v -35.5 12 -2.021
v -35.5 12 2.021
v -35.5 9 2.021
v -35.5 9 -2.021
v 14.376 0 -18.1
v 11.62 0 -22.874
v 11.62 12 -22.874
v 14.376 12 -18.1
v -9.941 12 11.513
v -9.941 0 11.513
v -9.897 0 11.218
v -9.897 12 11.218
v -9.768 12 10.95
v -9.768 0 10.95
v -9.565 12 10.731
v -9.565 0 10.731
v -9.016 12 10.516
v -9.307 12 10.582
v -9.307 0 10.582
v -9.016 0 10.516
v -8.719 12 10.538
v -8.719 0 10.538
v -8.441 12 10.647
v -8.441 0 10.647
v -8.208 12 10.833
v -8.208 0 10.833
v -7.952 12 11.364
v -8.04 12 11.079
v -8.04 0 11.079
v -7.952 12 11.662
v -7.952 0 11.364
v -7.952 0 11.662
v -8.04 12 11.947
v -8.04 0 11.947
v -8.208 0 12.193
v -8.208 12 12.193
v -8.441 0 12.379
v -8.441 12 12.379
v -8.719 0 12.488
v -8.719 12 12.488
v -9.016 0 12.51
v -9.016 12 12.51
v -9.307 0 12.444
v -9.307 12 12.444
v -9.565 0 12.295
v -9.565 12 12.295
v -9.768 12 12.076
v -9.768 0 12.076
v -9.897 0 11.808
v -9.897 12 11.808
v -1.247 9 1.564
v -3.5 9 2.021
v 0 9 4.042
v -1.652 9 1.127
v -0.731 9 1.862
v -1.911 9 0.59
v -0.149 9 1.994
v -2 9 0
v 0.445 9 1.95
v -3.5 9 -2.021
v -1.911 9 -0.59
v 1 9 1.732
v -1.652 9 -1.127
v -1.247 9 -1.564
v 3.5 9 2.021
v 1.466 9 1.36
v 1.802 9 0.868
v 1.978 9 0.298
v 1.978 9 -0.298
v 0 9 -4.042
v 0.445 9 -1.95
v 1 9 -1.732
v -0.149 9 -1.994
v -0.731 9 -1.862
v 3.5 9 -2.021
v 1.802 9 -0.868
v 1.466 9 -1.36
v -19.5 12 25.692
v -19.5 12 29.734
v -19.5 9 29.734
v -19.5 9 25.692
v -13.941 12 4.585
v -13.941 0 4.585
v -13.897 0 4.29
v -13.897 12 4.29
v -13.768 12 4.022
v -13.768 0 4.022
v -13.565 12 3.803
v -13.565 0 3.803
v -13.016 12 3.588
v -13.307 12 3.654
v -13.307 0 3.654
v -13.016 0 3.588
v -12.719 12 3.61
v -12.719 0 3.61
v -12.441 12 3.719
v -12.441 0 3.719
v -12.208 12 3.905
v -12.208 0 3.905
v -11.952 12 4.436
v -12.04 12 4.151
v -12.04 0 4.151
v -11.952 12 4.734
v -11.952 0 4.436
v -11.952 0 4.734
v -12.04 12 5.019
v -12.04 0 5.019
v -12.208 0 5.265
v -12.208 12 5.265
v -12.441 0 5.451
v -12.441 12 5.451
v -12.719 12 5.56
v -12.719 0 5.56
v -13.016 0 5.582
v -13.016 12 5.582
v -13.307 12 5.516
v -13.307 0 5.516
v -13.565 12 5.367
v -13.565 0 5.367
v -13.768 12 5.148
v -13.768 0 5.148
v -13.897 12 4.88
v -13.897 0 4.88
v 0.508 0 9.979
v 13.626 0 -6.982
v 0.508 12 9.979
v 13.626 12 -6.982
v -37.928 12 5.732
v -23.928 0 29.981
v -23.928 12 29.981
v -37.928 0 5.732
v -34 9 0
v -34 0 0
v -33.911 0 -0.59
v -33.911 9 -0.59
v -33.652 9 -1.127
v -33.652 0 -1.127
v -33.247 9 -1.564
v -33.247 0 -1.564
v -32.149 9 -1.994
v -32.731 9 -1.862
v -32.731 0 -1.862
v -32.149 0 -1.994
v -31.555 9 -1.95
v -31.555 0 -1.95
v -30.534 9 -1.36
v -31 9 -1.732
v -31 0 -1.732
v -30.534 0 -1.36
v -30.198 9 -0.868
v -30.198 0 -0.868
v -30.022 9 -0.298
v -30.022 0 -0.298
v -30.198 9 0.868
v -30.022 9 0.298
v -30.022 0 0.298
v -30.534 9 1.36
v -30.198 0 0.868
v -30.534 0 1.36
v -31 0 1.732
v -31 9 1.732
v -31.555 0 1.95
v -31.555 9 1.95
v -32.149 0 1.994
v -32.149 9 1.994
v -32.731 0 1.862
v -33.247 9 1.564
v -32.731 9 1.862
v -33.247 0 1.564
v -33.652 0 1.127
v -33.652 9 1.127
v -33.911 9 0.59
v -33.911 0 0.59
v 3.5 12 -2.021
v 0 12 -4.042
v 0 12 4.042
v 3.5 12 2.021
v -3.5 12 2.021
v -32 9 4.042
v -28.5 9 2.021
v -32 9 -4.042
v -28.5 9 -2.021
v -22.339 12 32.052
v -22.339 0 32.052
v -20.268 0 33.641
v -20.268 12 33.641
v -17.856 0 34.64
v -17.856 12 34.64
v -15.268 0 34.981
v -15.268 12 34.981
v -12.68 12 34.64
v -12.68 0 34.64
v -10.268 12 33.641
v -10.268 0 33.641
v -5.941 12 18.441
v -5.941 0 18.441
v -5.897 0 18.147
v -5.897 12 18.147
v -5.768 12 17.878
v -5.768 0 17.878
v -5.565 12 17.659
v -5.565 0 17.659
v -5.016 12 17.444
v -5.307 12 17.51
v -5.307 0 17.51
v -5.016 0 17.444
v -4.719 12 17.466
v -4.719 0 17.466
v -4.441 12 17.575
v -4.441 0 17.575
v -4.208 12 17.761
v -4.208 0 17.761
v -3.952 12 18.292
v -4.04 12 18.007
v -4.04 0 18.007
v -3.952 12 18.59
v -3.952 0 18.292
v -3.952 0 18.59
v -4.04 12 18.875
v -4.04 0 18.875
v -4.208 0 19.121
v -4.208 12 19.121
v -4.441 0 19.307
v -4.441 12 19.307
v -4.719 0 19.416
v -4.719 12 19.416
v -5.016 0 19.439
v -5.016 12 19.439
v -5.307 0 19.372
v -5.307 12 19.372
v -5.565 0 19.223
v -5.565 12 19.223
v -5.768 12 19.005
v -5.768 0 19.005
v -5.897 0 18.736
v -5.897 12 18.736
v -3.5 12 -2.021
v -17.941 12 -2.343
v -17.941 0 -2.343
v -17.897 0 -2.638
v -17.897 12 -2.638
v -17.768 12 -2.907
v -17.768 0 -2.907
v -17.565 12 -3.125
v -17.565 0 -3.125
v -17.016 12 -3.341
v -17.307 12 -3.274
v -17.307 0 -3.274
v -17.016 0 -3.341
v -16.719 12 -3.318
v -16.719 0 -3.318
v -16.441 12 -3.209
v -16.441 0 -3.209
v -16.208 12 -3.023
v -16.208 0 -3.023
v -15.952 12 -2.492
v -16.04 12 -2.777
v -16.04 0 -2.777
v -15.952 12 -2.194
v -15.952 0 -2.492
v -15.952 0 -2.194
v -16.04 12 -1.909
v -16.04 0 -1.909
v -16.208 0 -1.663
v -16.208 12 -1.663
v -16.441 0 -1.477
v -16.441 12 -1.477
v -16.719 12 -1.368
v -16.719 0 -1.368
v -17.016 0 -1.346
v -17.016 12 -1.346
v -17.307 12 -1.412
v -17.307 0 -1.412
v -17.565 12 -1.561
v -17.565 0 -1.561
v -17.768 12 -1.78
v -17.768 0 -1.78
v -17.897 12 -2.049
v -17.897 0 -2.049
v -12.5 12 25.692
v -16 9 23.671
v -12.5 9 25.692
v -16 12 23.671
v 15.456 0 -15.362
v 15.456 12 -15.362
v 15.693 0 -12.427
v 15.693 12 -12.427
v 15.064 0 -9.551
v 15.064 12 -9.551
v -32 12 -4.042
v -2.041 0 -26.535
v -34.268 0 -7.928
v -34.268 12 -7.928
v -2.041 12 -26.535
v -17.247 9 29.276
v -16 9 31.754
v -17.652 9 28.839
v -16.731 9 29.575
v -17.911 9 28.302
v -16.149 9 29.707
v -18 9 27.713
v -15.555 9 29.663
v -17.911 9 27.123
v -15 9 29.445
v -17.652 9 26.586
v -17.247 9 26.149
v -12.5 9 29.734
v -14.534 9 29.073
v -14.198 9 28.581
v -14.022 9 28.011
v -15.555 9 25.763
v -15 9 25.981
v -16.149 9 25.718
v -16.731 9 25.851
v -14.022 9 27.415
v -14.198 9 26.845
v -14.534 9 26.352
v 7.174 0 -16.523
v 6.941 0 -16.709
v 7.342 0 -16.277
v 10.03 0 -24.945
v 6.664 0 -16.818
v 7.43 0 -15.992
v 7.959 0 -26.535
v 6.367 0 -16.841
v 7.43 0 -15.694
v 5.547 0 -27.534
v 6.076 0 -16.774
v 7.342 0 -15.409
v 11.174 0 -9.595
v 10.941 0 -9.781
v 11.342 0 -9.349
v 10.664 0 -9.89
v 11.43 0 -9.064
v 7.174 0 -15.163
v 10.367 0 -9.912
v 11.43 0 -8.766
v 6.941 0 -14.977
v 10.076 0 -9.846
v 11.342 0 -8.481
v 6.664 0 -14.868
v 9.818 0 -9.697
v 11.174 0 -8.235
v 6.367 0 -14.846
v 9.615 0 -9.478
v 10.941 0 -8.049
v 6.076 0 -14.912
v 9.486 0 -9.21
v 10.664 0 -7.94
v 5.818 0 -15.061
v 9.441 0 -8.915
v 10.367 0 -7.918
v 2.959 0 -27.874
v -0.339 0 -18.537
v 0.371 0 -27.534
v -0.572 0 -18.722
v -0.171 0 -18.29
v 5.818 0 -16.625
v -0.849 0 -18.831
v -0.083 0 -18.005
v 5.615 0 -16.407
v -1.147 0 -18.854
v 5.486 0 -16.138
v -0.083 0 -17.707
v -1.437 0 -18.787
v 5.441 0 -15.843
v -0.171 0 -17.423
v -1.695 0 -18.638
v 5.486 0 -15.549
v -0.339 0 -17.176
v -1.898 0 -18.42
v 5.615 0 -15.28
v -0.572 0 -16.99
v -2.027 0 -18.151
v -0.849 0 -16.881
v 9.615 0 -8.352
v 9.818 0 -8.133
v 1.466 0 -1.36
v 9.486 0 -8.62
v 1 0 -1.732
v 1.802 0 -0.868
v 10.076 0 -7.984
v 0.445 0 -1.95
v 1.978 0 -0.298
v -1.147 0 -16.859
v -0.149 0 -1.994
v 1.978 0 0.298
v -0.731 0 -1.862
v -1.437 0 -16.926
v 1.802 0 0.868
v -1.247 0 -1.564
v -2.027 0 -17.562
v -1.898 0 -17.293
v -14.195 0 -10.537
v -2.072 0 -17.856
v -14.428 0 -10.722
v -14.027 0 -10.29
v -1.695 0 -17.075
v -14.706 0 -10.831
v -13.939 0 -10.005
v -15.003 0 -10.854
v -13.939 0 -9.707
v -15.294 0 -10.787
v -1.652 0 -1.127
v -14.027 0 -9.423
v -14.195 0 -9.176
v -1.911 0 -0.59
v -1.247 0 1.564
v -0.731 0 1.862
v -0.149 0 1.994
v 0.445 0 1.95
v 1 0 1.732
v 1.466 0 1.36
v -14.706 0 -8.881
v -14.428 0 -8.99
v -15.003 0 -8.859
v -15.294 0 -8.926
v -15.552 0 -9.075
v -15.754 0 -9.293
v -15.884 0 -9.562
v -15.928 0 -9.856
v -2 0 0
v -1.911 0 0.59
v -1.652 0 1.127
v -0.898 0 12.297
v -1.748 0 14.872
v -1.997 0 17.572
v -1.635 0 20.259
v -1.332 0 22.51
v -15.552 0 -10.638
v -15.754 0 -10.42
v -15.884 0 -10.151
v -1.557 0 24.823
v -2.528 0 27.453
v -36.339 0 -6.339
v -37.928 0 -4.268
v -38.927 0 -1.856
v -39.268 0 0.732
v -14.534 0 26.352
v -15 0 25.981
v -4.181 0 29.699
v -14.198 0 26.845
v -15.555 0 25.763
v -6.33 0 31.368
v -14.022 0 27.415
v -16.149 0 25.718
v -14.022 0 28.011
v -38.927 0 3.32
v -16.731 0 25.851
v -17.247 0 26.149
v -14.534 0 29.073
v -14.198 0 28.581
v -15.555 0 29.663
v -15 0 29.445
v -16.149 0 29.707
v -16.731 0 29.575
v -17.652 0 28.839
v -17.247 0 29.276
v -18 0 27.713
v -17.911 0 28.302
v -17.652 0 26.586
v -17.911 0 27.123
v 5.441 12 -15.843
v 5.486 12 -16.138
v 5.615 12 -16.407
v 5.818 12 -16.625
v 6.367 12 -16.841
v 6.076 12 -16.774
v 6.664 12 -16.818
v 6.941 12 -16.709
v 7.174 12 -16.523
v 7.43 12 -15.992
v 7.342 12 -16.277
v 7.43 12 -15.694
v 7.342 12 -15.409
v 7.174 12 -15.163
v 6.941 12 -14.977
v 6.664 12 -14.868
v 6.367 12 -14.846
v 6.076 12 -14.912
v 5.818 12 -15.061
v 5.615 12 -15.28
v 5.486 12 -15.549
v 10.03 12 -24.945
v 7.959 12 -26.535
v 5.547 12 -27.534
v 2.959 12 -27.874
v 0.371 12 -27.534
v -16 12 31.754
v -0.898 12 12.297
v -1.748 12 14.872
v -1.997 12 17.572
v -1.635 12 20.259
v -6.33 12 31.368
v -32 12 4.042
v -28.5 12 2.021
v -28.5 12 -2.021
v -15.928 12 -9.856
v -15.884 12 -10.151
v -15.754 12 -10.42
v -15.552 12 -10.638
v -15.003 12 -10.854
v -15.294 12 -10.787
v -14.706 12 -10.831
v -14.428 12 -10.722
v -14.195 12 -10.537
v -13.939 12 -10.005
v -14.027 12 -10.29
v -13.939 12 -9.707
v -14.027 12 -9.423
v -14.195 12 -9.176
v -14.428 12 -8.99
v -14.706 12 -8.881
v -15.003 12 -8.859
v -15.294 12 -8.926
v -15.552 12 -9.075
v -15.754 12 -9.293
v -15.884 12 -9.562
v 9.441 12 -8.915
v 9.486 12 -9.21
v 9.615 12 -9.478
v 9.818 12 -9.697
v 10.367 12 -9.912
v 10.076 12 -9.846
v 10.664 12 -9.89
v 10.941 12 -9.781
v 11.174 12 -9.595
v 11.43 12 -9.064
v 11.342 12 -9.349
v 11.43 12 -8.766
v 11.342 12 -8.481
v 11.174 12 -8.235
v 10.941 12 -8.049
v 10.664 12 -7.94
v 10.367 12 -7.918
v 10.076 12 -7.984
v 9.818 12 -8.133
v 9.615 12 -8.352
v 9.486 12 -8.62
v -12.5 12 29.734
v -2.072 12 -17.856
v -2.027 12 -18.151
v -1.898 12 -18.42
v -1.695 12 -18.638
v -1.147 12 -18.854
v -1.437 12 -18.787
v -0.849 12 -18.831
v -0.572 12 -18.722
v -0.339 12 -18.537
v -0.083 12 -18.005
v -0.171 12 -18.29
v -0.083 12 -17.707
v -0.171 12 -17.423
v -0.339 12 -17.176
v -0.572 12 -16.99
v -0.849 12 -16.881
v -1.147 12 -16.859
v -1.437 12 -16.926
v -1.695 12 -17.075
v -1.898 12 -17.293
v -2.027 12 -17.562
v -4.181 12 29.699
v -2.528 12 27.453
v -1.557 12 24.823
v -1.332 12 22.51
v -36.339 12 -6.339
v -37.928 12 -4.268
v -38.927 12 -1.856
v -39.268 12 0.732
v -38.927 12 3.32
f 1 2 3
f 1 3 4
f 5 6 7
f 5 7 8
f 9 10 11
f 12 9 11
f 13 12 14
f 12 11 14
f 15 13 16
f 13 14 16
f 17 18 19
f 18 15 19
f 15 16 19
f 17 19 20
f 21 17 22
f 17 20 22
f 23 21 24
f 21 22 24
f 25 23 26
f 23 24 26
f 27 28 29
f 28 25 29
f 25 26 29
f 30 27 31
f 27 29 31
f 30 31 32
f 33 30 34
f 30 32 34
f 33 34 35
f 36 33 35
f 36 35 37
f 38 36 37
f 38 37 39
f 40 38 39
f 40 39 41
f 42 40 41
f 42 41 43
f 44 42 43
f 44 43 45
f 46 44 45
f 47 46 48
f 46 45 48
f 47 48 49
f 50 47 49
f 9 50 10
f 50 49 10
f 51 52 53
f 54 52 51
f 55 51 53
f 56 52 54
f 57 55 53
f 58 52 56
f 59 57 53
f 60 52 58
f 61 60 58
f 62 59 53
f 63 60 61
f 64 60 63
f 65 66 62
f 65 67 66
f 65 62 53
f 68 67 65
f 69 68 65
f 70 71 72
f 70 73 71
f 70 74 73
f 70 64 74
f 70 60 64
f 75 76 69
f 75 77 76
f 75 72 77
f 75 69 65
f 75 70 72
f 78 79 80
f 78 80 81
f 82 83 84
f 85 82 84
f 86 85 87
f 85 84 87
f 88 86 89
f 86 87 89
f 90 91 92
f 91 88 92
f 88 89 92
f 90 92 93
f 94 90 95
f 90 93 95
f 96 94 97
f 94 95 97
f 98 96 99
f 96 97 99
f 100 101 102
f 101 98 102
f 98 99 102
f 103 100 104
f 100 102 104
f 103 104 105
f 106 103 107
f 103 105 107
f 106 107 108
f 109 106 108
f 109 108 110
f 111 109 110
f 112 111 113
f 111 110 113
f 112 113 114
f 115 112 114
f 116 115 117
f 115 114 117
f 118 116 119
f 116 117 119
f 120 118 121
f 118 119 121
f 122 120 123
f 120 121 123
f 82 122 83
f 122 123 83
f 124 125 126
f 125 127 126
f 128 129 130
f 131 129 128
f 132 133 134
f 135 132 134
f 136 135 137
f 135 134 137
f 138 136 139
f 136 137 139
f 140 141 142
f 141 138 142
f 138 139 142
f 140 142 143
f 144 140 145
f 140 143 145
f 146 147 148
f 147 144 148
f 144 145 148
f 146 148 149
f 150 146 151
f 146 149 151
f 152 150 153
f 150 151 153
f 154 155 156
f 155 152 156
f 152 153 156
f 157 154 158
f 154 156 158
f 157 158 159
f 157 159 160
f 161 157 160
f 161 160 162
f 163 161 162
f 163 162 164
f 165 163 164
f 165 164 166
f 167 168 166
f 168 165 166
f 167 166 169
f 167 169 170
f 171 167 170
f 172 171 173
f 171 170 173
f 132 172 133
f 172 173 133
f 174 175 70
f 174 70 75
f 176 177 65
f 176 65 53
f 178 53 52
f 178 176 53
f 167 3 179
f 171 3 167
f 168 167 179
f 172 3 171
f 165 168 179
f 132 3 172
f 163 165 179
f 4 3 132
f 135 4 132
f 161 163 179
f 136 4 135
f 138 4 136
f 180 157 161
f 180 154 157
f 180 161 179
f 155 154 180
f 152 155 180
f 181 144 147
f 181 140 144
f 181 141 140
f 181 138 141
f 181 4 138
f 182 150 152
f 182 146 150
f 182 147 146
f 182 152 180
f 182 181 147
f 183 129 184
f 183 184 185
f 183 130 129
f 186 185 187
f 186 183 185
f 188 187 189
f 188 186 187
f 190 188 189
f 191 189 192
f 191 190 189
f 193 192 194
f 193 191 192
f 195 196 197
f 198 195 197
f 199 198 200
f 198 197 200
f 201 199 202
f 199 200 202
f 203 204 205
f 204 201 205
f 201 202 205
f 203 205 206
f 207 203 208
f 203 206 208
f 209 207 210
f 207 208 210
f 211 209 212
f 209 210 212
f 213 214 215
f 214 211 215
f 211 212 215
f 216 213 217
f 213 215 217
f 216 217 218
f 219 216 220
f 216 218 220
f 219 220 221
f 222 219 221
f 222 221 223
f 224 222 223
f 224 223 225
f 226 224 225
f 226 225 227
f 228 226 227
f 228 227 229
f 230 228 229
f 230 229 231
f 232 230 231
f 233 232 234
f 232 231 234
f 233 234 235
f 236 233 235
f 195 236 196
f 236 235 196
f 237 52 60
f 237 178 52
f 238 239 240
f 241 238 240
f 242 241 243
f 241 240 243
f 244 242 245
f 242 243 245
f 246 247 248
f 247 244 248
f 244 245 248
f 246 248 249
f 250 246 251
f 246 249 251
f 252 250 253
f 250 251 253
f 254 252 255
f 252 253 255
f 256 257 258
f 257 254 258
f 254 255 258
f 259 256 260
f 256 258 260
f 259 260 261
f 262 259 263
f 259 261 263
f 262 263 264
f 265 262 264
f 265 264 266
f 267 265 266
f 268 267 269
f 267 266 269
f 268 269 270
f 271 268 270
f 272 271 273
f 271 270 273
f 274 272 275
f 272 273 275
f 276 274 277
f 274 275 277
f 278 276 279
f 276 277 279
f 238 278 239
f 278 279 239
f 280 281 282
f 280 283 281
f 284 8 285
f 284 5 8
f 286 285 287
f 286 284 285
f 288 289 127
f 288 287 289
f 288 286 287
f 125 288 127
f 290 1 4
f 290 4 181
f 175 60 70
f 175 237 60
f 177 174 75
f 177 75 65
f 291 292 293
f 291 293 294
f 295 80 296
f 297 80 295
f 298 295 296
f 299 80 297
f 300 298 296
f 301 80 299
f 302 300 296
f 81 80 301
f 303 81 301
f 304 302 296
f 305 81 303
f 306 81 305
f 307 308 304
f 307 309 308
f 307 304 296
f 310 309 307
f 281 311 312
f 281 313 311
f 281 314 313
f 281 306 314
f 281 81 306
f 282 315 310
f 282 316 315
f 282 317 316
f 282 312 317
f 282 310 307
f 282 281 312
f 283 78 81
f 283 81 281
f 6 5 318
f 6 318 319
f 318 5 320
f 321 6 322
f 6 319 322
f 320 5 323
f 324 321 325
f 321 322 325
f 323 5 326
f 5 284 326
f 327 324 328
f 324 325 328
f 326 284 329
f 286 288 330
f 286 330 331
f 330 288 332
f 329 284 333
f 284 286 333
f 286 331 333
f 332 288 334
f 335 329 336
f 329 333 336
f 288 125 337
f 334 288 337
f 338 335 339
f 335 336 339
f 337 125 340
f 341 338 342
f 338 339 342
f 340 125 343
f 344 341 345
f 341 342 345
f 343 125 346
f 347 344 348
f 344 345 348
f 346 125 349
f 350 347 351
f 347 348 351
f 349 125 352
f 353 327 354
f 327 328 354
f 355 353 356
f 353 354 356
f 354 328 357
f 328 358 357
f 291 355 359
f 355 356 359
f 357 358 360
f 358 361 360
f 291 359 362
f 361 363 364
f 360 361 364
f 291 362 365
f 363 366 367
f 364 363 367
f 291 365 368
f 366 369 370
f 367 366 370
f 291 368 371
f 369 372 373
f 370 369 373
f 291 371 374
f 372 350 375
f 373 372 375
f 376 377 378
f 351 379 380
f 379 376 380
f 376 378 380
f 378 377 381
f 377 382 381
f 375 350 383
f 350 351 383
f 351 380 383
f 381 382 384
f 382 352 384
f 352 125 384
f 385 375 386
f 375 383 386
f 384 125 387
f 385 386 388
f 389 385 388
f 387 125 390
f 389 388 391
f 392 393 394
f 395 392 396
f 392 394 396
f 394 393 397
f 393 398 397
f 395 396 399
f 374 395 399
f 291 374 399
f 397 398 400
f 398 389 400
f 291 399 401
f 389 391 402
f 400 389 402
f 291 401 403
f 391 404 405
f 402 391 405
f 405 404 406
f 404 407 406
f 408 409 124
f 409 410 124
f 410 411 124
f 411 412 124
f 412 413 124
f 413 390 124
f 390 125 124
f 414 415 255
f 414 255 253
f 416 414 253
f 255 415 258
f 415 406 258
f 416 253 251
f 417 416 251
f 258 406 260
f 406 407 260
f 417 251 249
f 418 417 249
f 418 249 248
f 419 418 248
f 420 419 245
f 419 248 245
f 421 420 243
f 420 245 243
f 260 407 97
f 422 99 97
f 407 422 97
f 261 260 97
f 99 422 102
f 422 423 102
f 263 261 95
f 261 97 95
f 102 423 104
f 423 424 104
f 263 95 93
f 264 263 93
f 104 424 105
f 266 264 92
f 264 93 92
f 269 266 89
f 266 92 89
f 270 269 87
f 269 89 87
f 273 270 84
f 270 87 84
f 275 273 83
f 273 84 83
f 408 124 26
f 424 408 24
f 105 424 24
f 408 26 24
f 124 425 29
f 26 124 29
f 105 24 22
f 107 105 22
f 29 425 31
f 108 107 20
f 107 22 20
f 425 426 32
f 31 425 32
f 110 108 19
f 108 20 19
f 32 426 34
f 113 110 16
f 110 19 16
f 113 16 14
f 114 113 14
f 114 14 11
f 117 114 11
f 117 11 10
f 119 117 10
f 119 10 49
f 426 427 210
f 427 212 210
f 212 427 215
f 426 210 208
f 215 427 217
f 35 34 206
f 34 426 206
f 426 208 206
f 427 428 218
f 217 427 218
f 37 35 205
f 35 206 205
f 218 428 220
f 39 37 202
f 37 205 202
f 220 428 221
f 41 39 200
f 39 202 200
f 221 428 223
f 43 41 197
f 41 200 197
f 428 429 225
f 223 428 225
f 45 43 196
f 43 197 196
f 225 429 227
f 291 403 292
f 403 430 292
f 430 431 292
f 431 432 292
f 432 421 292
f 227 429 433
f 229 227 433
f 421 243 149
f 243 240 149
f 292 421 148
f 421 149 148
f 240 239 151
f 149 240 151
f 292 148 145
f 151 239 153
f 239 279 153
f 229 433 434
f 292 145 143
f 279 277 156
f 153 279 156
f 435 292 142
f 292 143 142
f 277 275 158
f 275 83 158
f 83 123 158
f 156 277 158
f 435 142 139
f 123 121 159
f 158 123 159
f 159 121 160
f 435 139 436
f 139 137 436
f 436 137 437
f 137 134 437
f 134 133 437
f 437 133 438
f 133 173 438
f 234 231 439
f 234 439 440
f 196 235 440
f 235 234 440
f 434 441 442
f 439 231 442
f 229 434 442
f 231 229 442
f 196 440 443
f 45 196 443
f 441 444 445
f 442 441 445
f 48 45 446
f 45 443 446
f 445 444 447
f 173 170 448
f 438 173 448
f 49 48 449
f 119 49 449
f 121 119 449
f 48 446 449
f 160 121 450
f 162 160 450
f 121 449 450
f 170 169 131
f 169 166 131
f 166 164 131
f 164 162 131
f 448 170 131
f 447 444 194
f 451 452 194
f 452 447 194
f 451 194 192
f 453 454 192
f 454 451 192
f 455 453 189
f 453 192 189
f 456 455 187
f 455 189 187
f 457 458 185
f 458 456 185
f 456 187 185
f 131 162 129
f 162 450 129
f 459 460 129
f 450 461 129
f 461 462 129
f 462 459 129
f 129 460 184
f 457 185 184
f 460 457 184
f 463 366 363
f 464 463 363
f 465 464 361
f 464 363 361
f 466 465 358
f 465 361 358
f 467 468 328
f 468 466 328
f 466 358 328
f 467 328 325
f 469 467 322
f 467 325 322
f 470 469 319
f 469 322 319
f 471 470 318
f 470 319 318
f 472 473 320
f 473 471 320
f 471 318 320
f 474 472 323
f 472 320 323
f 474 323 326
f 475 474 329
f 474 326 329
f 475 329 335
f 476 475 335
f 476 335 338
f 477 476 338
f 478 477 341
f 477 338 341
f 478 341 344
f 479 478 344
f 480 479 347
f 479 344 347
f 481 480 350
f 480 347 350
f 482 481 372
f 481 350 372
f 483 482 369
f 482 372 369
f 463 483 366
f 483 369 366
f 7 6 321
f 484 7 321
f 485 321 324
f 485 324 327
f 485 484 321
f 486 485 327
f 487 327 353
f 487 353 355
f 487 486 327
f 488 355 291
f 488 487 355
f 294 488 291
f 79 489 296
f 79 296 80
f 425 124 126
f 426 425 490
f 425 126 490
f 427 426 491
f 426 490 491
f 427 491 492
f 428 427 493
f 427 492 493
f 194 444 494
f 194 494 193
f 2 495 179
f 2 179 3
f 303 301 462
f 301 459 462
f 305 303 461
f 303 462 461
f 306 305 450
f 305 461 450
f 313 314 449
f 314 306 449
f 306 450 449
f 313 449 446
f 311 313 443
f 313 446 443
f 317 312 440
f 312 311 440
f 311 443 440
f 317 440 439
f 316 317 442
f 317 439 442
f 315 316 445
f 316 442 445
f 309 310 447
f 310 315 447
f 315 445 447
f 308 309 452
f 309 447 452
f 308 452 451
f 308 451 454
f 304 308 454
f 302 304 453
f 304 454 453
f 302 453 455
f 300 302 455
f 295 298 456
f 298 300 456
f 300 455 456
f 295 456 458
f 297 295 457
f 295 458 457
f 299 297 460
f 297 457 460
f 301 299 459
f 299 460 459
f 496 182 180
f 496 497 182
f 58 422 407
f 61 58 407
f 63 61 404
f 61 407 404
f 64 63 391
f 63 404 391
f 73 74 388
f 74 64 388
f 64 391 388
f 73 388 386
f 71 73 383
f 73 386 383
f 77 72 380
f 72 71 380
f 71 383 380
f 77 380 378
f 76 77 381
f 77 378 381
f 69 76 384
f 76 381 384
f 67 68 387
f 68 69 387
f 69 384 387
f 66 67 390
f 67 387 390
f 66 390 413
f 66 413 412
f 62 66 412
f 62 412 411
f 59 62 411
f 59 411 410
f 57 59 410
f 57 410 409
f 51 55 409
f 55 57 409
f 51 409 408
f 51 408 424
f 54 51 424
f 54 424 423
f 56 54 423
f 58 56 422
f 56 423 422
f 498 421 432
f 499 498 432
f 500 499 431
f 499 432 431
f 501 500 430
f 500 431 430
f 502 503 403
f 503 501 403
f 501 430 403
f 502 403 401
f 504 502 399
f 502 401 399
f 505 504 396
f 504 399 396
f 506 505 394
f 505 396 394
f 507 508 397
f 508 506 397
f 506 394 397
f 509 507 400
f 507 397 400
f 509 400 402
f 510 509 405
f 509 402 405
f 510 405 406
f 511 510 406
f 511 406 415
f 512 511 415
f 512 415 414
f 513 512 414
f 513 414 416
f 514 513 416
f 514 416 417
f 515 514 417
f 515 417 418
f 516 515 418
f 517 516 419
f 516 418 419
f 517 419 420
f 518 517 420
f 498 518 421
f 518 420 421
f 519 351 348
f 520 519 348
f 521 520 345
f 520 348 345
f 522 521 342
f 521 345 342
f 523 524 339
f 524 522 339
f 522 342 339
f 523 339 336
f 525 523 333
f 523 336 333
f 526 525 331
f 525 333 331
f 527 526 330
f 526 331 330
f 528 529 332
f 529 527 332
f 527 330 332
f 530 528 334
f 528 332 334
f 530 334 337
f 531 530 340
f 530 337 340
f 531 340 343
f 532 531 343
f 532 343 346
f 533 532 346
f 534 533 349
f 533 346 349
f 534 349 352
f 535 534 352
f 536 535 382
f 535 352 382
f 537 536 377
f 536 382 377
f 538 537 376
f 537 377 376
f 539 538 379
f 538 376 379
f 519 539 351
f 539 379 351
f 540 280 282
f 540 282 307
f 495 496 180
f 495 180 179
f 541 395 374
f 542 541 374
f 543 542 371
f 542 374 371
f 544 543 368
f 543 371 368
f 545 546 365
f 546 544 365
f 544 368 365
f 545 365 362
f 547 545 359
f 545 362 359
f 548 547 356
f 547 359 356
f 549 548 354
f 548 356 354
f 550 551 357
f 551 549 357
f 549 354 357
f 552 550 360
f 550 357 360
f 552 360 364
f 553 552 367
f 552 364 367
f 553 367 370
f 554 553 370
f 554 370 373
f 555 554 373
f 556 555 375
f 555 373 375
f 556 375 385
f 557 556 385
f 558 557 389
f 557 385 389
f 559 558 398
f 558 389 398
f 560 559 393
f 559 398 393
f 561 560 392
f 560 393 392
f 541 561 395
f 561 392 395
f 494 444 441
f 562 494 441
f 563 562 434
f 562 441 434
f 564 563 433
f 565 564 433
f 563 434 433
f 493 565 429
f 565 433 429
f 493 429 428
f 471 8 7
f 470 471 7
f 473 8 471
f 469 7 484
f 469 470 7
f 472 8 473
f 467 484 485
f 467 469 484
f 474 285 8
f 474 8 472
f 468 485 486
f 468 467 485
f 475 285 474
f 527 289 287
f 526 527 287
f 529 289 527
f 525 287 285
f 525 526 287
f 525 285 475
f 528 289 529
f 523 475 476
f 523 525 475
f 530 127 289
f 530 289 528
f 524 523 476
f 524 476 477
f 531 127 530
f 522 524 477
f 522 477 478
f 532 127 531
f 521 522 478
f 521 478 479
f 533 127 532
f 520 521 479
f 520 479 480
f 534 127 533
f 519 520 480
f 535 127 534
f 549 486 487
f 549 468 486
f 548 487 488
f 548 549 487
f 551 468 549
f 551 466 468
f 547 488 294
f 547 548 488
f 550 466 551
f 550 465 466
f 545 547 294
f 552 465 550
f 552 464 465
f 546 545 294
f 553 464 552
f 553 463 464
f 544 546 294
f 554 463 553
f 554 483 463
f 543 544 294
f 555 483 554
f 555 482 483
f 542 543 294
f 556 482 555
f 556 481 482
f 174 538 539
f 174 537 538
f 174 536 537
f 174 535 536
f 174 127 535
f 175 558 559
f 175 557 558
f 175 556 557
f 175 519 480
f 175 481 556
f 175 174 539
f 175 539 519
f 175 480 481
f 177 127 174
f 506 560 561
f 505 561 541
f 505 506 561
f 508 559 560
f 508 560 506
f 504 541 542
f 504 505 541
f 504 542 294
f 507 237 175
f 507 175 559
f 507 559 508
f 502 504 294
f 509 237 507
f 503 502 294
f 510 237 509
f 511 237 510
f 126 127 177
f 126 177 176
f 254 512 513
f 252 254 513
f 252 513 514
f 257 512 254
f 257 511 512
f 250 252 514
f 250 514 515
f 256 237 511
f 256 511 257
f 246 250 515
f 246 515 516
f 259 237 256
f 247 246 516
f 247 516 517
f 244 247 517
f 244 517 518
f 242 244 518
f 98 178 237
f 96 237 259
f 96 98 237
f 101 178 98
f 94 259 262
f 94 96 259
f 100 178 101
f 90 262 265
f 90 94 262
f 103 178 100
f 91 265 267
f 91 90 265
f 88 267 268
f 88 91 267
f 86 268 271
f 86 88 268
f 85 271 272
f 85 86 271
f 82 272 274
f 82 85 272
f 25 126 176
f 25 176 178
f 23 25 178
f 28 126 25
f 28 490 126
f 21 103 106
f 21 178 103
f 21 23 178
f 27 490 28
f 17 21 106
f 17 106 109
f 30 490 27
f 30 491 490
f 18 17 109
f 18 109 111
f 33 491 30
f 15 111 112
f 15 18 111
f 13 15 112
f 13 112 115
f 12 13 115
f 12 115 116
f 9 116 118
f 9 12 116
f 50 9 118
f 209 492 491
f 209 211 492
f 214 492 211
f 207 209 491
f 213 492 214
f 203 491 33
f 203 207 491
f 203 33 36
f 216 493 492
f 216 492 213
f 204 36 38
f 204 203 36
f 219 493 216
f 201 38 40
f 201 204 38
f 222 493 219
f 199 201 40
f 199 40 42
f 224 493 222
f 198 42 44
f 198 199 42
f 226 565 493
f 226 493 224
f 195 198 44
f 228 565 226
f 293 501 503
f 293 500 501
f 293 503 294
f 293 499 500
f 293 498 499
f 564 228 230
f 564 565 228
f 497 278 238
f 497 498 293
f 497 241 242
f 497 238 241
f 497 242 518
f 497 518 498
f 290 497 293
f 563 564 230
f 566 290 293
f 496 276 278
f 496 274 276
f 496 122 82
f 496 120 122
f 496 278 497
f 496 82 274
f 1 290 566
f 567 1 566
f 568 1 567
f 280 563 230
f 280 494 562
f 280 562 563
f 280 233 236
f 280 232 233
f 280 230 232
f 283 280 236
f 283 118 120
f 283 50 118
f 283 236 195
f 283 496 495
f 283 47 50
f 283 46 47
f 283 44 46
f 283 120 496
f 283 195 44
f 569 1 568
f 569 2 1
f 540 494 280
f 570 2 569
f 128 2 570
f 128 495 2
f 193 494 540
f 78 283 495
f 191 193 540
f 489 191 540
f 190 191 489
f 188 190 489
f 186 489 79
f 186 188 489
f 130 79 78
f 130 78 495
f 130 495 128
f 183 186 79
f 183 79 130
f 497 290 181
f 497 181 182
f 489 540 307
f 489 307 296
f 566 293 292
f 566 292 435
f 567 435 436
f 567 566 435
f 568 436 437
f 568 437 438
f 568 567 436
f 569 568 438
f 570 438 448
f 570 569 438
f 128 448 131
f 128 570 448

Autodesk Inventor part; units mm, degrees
ref_plane "YZ Plane" through (0, 0, 0) normal (1, 0, 0) x (0, 1, 0)
ref_plane "XZ Plane" through (0, 0, 0) normal (0, 1, 0) x (-1, 0, 0)
ref_plane "XY Plane" through (0, 0, 0) normal (0, 0, 1) x (1, 0, 0)
sketch "Esquisse1" plane through (0, 0, 0) normal (0, 1, 0) x (-1, 0, 0)
  line L0 (0, 0) -> (32, 0) construction
  line L1 (32, 0) -> (16, 27.7128) construction
  line L2 (16, 27.7128) -> (0, 0) construction
  line L3 (-10.3913, 17.9982) -> (9.0252, -15.6322) construction
  line L4 (8, -13.8564) -> (32, 0) construction
  line L5 (8, -13.8564) -> (14.9282, -9.8564) construction
  line L6 (8, -13.8564) -> (-10, 17.3205) construction
  line L7 (-10, 17.3205) -> (1.6913, 24.0705) construction
  line L8 (1.6913, 24.0705) -> (4.9413, 18.4413) construction
  line L9 (4.9413, 18.4413) -> (8.9413, 11.5131) construction
  line L10 (8.9413, 11.5131) -> (12.9413, 4.5849) construction
  line L11 (12.9413, 4.5849) -> (16.9413, -2.3433) construction
  circle A0 centre (8.9413, 11.5131) radius 1
  circle A1 centre (12.9413, 4.5849) radius 1
  circle A2 centre (16.9413, -2.3433) radius 1
  circle A3 centre (14.9282, -9.8564) radius 1
  circle A4 centre (4.9413, 18.4413) radius 1
  circle A5 centre (-14.4413, -1.9869) radius 1 construction
  circle A6 centre (-10.4413, -8.9151) radius 1
  circle A7 centre (-6.4413, -15.8433) radius 1
  circle A8 centre (1.0718, -17.8564) radius 1
  circle A9 centre (-18.4413, 4.9413) radius 1 construction
  circle A10 centre (-10, 17.3205) radius 11.6 construction
  line L12 (32, 0) -> (36, -6.9282) construction
  line L13 (36.0415, 0) -> (34.0207, -3.5) construction
  line L14 (34.0207, -3.5) -> (29.9793, -3.5) construction
  line L15 (29.9793, -3.5) -> (27.9585, 0) construction
  line L16 (27.9585, 0) -> (29.9793, 3.5) construction
  line L17 (29.9793, 3.5) -> (34.0207, 3.5) construction
  line L18 (34.0207, 3.5) -> (36.0415, 0) construction
  line L19 (34.0207, 3.5) -> (34.0207, -3.5) construction
  circle A11 centre (16, 27.7128) radius 2
  circle A12 centre (32, 0) radius 2
  line L20 (32, 0) -> (38.9282, 4) construction
  line L21 (-6.4413, -15.8433) -> (-13.3695, -19.8433) construction
  line L22 (42.9282, -2.9282) -> (-6.6195, -31.5346)
  line L23 (-6.6195, -31.5346) -> (-30.6195, 10.0346)
  line L24 (-30.6195, 10.0346) -> (18.9282, 38.641)
  line L25 (18.9282, 38.641) -> (42.9282, -2.9282)
  line L26 (8, -13.8564) -> (12, -20.7846) construction
  line L27 (16, 27.7128) -> (12, 34.641) construction
  circle A13 centre (0, 0) radius 2
  dimension "d0" = 32
  dimension "d1" = 32
  dimension "d2" = 60
  dimension "d4" = 8
  dimension "d6" = 36
  dimension "d7" = 13.5
  dimension "d8" = 6.5
  dimension "d9" = 8
  dimension "d10" = 8
  dimension "d11" = 8
  dimension "d13" = 2
  dimension "d14" = 11.6
  dimension "d15" = 8
  dimension "d16" = 7
  dimension "d17" = 4
  dimension "d19" = 8
  dimension "d20" = 8
  dimension "d26" = 8
  dimension "d27" = 8
extrude "Extrusion4" add sketch "Esquisse1" along normal blind 12
sketch "Esquisse7" plane through (0, 12, 0) normal (0, 1, 0) x (1, 0, 0)
  circle A0 centre (10.4413, 8.9151) radius 1 projected
  circle A1 centre (-4.9413, -18.4413) radius 1 projected
  line L0 (-18.9282, -38.641) -> (30.6195, -10.0346) projected
  line L1 (30.6195, -10.0346) -> (6.6195, 31.5346) projected
  line L2 (-4.9413, -18.4413) -> (-1.6913, -24.0705) construction
  line L3 (-1.6913, -24.0705) -> (10, -17.3205) construction
  circle A2 centre (10, -17.3205) radius 12 construction
  line L4 (10.4413, 8.9151) -> (12.4413, 5.451) construction
  line L5 (-0.3923, -23.3205) -> (1.6077, -26.7846)
  line L6 (17.7305, 12.2898) -> (0.5077, -9.9791)
  arc A3 (0.5077, -9.9791) -> (-0.3923, -23.3205) centre (10, -17.3205) ccw
  dimension "d54" = 6.5
  dimension "d55" = 13.5
  dimension "d56" = 24
  dimension "d57" = 4
extrude "Extrusion5" cut sketch "Esquisse7" against normal through all contours L5 A3 L6 L1 L0
fillet "Congé8" radius 10 1 edges at (1.6077, 6, 26.7846)
fillet "Congé9" radius 10 1 edges at (17.7305, 6, -12.2898)
fillet "Congé10" radius 10 1 edges at (6.6195, 6, -31.5346)
fillet "Congé11" radius 10 1 edges at (-42.9282, 6, -2.9282)
fillet "Congé12" radius 10 1 edges at (-18.9282, 6, 38.641)
sketch "Esquisse8" plane through (0, 12, 0) normal (0, 1, 0) x (1, 0, 0)
  circle A0 centre (0, 0) radius 2 projected
  circle A1 centre (-32, 0) radius 2 projected
  circle A2 centre (-16, -27.7128) radius 2 projected
  circle A3 centre (6.4413, 15.8433) radius 1 projected
  circle A4 centre (10.4413, 8.9151) radius 1 projected
  line L0 (-2.0407, 26.5346) -> (-34.2679, 7.9282) projected
  line L1 (-28.5, 2.0207) -> (-28.5, -2.0207)
  line L2 (-28.5, -2.0207) -> (-32, -4.0415)
  line L3 (-32, -4.0415) -> (-35.5, -2.0207)
  line L4 (-35.5, -2.0207) -> (-35.5, 2.0207)
  line L5 (-35.5, 2.0207) -> (-32, 4.0415)
  line L6 (-32, 4.0415) -> (-28.5, 2.0207)
  line L7 (-19.5, -25.6921) -> (-16, -23.6714)
  line L8 (-16, -23.6714) -> (-12.5, -25.6921)
  line L9 (-12.5, -25.6921) -> (-12.5, -29.7335)
  line L10 (-12.5, -29.7335) -> (-16, -31.7543)
  line L11 (-16, -31.7543) -> (-19.5, -29.7335)
  line L12 (-19.5, -29.7335) -> (-19.5, -25.6921)
  line L13 (-32, 4.0415) -> (-28.5, -2.0207) construction
  line L14 (0, 4.0415) -> (3.5, 2.0207)
  line L15 (3.5, 2.0207) -> (3.5, -2.0207)
  line L16 (3.5, -2.0207) -> (0, -4.0415)
  line L17 (0, -4.0415) -> (-3.5, -2.0207)
  line L18 (-3.5, -2.0207) -> (-3.5, 2.0207)
  line L19 (-3.5, 2.0207) -> (0, 4.0415)
  dimension "d66" = 7
extrude "Extrusion6" cut sketch "Esquisse8" against normal blind 3 contours L1 L2 L3 L4 L5 L6 | L7 L8 L9 L10 L11 L12 | L14 L15 L16 L17 L18 L19
properties part number "joint3+ax12imprint_v2"
